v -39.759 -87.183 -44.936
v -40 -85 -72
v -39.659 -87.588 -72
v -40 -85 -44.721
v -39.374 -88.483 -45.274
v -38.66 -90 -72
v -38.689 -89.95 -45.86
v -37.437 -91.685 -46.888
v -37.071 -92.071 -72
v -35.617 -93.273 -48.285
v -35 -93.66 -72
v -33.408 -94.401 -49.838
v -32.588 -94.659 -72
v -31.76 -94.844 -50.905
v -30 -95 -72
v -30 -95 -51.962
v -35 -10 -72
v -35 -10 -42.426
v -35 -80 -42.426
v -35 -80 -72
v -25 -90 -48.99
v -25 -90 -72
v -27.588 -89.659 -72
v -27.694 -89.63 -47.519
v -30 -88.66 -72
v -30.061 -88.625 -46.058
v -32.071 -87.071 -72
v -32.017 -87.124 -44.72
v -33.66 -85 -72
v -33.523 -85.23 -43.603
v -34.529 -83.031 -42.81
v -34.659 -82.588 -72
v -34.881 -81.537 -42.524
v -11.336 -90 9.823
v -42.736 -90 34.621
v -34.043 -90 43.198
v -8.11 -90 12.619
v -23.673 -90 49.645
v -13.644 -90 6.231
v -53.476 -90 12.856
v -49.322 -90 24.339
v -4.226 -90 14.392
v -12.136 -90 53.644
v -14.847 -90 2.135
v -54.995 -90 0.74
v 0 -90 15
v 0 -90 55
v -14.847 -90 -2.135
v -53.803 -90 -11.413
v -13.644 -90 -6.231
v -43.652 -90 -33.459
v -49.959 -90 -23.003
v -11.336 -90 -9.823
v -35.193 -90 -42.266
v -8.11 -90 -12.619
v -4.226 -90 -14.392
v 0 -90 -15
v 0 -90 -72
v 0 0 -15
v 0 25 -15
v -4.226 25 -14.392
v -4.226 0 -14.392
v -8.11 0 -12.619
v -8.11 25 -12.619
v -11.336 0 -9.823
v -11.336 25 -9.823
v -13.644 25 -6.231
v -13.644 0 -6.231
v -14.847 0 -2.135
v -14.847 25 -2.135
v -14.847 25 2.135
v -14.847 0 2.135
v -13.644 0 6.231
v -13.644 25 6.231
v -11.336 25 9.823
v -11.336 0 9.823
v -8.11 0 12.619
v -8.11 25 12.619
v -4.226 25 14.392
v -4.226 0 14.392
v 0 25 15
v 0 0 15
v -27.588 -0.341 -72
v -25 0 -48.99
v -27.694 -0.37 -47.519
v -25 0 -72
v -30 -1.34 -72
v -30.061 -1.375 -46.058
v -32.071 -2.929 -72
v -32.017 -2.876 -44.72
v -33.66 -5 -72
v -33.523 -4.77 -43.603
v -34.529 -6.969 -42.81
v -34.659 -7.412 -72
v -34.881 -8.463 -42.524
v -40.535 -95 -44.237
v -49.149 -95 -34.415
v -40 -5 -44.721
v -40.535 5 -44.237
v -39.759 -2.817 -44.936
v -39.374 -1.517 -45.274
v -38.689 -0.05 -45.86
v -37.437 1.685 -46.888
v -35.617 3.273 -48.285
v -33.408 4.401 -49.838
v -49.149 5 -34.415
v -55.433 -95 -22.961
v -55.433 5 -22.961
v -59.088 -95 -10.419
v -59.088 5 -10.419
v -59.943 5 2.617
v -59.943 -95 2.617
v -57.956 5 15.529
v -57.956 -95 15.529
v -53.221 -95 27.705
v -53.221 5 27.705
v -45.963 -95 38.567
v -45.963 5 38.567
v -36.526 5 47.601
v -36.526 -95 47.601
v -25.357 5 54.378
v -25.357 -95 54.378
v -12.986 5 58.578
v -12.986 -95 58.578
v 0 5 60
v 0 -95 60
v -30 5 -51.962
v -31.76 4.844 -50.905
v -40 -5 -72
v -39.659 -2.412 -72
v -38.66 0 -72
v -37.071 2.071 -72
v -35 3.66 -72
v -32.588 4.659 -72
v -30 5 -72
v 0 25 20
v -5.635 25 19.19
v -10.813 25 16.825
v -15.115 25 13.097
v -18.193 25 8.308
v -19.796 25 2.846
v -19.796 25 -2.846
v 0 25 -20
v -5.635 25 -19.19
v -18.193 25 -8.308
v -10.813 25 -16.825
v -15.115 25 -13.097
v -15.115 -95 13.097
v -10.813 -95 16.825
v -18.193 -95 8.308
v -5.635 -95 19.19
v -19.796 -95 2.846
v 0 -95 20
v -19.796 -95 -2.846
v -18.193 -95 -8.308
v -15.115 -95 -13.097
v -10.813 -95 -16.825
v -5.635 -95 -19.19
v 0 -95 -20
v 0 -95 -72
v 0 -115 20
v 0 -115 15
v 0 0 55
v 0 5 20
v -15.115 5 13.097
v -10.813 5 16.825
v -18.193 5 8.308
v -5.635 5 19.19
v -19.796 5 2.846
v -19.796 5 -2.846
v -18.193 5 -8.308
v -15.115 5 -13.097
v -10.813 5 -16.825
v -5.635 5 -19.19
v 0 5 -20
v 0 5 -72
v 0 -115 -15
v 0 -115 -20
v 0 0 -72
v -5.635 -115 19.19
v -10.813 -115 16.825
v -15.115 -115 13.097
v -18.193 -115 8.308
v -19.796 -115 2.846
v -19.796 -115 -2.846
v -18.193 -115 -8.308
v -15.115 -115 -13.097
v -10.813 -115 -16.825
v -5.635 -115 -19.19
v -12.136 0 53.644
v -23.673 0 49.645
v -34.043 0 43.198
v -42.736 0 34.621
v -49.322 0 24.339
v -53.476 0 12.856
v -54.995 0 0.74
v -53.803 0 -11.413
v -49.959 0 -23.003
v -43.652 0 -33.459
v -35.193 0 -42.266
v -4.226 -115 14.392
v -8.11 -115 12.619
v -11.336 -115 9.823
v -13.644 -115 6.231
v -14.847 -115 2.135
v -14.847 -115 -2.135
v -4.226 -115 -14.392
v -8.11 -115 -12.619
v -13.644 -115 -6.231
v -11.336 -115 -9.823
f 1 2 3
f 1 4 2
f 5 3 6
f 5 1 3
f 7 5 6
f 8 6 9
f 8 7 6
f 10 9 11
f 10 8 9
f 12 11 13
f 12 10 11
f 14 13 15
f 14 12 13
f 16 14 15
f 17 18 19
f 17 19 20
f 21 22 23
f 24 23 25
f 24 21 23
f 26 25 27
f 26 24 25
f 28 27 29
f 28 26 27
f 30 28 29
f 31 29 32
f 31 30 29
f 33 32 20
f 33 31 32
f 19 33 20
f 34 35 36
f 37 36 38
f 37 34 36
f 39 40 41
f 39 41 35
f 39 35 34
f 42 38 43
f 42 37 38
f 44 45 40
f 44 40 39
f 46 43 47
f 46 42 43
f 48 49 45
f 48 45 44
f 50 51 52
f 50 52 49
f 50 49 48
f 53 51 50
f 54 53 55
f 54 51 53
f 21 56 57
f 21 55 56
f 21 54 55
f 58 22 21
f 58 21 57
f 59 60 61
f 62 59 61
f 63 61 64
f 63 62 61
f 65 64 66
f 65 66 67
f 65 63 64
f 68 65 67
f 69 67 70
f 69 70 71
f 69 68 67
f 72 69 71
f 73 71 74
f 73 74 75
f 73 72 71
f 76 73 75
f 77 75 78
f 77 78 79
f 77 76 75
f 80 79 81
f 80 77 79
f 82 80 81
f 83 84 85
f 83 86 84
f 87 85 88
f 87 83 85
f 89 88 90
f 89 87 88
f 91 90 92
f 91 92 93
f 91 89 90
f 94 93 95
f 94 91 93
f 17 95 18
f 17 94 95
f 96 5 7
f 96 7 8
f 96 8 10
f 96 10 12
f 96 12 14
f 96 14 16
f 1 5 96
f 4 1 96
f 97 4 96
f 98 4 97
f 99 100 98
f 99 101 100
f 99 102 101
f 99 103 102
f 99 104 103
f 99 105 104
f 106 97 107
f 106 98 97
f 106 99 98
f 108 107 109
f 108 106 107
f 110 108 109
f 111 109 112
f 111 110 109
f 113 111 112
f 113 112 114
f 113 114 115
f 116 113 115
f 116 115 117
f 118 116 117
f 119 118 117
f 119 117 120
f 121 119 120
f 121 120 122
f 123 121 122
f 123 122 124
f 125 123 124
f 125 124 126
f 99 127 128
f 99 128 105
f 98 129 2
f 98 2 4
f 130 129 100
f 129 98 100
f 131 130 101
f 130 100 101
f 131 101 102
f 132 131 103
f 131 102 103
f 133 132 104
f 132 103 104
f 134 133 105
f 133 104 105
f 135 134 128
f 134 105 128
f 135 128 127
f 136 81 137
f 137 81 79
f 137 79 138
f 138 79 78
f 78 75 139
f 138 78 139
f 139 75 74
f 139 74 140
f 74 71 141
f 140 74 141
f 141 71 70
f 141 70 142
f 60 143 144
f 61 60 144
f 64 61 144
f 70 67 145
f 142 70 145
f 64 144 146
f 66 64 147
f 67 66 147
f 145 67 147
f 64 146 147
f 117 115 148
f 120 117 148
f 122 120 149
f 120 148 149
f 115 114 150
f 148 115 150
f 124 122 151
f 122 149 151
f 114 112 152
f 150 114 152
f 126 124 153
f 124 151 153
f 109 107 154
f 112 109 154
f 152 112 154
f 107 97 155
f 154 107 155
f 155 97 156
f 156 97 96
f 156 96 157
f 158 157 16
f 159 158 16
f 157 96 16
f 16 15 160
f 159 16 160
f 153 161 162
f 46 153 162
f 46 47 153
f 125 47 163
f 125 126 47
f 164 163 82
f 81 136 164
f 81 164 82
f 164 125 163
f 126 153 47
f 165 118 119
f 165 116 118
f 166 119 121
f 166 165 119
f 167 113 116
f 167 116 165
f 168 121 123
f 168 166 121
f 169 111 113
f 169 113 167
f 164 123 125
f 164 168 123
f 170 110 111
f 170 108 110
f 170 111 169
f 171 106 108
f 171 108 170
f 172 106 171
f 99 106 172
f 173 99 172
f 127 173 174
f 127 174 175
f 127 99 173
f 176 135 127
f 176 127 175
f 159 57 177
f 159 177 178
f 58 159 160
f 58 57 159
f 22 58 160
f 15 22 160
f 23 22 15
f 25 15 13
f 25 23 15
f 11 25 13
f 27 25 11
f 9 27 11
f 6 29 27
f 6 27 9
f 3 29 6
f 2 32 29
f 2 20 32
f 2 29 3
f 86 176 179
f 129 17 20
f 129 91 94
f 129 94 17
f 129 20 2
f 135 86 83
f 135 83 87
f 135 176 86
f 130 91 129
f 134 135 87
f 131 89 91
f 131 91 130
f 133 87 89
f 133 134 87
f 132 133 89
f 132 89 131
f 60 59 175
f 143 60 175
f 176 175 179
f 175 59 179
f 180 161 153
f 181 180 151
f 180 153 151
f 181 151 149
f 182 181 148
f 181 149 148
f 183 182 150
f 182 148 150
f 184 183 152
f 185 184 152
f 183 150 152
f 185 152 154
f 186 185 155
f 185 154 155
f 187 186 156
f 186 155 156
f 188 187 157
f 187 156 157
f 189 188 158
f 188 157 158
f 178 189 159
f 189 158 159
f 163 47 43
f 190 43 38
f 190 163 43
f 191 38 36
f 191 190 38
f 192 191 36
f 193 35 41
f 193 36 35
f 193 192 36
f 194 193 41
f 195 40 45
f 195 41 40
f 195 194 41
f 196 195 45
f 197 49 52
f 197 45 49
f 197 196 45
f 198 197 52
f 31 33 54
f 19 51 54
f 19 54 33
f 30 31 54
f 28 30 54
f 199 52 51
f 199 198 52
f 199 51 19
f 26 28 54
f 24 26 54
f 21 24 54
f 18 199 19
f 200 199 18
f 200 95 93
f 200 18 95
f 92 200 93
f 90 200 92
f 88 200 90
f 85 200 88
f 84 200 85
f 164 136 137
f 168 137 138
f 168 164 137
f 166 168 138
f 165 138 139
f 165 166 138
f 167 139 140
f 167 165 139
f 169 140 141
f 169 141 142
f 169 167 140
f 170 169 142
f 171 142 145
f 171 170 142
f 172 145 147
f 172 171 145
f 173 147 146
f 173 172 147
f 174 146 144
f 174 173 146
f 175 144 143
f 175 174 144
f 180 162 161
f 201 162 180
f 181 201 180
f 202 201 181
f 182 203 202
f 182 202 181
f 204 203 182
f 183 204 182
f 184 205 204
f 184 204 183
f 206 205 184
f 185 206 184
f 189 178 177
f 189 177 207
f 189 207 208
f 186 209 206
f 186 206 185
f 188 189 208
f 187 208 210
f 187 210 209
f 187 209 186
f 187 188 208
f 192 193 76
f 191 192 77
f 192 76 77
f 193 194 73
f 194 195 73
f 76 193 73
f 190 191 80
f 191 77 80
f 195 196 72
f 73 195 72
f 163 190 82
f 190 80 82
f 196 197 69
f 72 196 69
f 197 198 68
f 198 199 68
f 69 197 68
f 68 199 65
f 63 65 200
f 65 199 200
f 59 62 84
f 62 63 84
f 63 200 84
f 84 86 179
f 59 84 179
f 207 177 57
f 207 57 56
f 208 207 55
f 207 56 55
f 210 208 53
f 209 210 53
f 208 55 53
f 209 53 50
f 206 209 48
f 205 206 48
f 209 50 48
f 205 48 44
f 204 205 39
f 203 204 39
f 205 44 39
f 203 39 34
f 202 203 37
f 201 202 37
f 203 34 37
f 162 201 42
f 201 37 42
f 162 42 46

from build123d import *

# Parameters (mm, degrees)
DODANIE_WYCI_GNI_CIE1_DEPTH       = 25
DODANIE_WYCI_GNI_CIE2_DEPTH       = 5
WYCI_GNI_CIE_CIENKA_CIANKA1_REACH = 150.354
ZAOKR_GLENIE1_R                   = 10
ZAOKR_GLENIE2_R                   = 10
ZAOKR_GLENIE3_R                   = 10
ZAOKR_GLENIE4_R                   = 10


with BuildPart() as part:
    # Szkic1 → Dodanie-wyciągnięcie1 (new body)
    with BuildSketch(Plane(origin=(0, 0, 0), x_dir=(1, 0, 0), z_dir=(0, 1, 0))):
        with BuildLine():
            Line((0, 20), (0, 15))
            ThreePointArc((0, 15), (-15, 0), (0, -15))
            Line((0, -15), (0, -20))
            ThreePointArc((0, -20), (-20, 0), (0, 20))
        make_face()
    extrude(amount=DODANIE_WYCI_GNI_CIE1_DEPTH)

    # Szkic2 → Dodanie-wyciągnięcie2 (add)
    with BuildSketch(Plane(origin=(0, 0, 0), x_dir=(1, 0, 0), z_dir=(0, 1, 0))):
        with BuildLine():
            Line((0, 20), (0, 72))
            Line((0, 72), (-40, 72))
            Line((-40, 72), (-40, 44.72135955))
            ThreePointArc((-40, 44.72135955), (-56.050341538, -21.409325386), (0, -60))
            Line((0, -60), (0, -20))
            ThreePointArc((0, -20), (-20, 0), (0, 20))
        make_face()
    extrude(amount=DODANIE_WYCI_GNI_CIE2_DEPTH)


with BuildPart() as body_2:
    # Lustro3: mirrored copy
    add(part.part.mirror(Plane.ZX.offset(-45)))

    # Szkic3 → Wyciągnięcie-cienka ścianka1 (add, up to next)
    with BuildSketch(Plane(origin=(0, 0, 0), x_dir=(1, 0, 0), z_dir=(0, 1, 0)), mode=Mode.PRIVATE) as wyci_gni_cie_cienka_cianka1_sk1:
        with BuildLine():
            Line((-40, 72), (-40, 44.72135955))
            ThreePointArc((-40, 44.72135955), (-56.050341538, -21.409325386), (0, -60))
            Line((0, -60), (0, -55))
            ThreePointArc((0, -55), (-51.76124215, -18.594994247), (-35, 42.426406871))
            Line((-35, 42.426406871), (-35, 72))
            Line((-35, 72), (-40, 72))
        make_face()
    wyci_gni_cie_cienka_cianka1_tool1 = extrude(wyci_gni_cie_cienka_cianka1_sk1.sketch, amount=-WYCI_GNI_CIE_CIENKA_CIANKA1_REACH, mode=Mode.PRIVATE) - body_2.part

    add(part.part)  # Wyciągnięcie-cienka ścianka1 merges part
    add(wyci_gni_cie_cienka_cianka1_tool1.solids().sort_by_distance((-36.449966, 0, -57.213203))[0])

    # Zaokrąglenie1
    zaokr_glenie1_edges = [body_2.edges().sort_by_distance(p)[0] for p in [
        (-40, 5, -58.360679775),
    ]]
    fillet(zaokr_glenie1_edges, radius=ZAOKR_GLENIE1_R)

    # Zaokrąglenie2
    zaokr_glenie2_edges = [body_2.edges().sort_by_distance(p)[0] for p in [
        (-40, -95, -58.360679775),
    ]]
    fillet(zaokr_glenie2_edges, radius=ZAOKR_GLENIE2_R)

    # Zaokrąglenie3
    zaokr_glenie3_edges = [body_2.edges().sort_by_distance(p)[0] for p in [
        (-35, 0, -57.213203436),
    ]]
    fillet(zaokr_glenie3_edges, radius=ZAOKR_GLENIE3_R)

    # Zaokrąglenie4
    zaokr_glenie4_edges = [body_2.edges().sort_by_distance(p)[0] for p in [
        (-35, -90, -57.213203436),
    ]]
    fillet(zaokr_glenie4_edges, radius=ZAOKR_GLENIE4_R)


solid = body_2.part
